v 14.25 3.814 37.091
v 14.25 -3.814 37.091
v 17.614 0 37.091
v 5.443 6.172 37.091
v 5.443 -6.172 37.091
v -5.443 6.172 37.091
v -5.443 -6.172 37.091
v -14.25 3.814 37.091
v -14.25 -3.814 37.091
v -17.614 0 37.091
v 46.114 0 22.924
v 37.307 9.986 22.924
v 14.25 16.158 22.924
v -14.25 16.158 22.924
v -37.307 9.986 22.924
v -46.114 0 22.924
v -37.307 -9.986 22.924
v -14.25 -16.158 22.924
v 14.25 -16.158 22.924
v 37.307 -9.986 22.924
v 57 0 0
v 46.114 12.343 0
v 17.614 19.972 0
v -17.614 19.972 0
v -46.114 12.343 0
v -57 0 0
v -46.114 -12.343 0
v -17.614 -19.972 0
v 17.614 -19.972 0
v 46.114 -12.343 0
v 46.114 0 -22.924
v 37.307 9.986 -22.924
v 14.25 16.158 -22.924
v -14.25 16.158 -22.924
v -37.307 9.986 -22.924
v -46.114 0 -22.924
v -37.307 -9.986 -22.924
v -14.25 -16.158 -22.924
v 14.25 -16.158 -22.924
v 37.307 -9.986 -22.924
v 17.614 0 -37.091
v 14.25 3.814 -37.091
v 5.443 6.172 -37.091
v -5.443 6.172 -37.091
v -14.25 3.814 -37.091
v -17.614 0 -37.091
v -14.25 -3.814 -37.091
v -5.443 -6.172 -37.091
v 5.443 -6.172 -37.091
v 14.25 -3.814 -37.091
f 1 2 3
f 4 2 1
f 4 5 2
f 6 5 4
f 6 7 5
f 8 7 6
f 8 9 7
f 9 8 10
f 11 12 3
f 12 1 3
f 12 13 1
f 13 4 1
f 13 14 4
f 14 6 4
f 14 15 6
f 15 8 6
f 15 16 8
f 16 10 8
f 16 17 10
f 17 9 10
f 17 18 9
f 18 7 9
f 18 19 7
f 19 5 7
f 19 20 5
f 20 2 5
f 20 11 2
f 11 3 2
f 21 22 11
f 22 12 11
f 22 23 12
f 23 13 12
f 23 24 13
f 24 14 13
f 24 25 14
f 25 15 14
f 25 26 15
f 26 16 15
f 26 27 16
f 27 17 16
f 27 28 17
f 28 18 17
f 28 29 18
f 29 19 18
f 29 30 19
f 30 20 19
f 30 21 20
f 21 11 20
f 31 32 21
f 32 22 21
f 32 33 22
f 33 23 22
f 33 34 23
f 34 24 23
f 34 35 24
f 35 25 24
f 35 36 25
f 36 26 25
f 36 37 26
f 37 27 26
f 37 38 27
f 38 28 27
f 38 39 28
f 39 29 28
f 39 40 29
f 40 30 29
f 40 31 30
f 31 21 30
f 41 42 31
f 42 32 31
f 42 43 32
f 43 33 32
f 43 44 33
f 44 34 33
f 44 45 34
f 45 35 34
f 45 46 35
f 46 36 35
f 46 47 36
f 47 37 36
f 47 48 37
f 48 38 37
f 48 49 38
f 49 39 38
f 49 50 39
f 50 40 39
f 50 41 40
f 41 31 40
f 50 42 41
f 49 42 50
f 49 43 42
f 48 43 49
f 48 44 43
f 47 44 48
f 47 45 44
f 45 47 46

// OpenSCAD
// Generated by SolidPython 1.0.1 on 2020-07-29 00:46:53


scale(v = [19, 7, 13]) {
	sphere(r = 3);
}
/***********************************************
*********      SolidPython code:      **********
************************************************
 
# import packages: SolidPython
from solid import *
from solid.utils import *
from itertools import chain, combinations, permutations


class Resize:

    def __init__(self, scad_file):
        self.scad_file = scad_file
        #self.scad_file = import_scad(scad_file)
        # cone/cylinder param:
        self.r1 = 0
        self.r2 = 0
        self.h = 0
        # rectangular prism param:
        self.w = 0
        self.l = 0
        # ellipse param:
        self.r = 0

    # import OpenScad code (file name corresponds to shape)


    # classify shape + parameters
    def assign(self, param1, param2, param3):
        if self.scad_file == 'cone.scad':
            self.r1 = param1
            self.r2 = param2
            self.h = param3
        elif self.scad_file == 'cylinder.scad':
            self.r1 = param1
            self.r2 = param2
            self.h = param3
        elif self.scad_file == 'rectangularPrism.scad':
            self.h = param1
            self.l = param2
            self.w = param3
        else:
            self.r = param1
            self.h = param2

    # resize parameters
    def iterate(self):
        x = range(3, 20, 2)
        i = 1
        if self.scad_file == 'cone.scad':
            tempList = list(permutations(x, 2))
            for temp in tempList:
                param1 = temp[0]
                param2 = temp[1]
                filepath = 'produced_scad_files/' + 'cone' + str(param1) + '_' + str(param2) + '_' + '.scad'
                scad_render_to_file(cylinder(h=param1, r1=param2, r2=0), filepath)

        elif self.scad_file == 'cylinder.scad':
            tempList = list(permutations(x, 3))
            for temp in tempList:
                param1 = temp[0]
                param2 = temp[1]
                filepath = 'produced_scad_files/' + 'cylinder' + str(param1) + '_' + str(param2) + '_' + '.scad'
                scad_render_to_file(cylinder(h=param1, r1=param2, r2=param2), filepath)

        elif self.scad_file == 'rectangularPrism.scad':
            tempList = list(permutations(x, 3))
            for temp in tempList:
                param1 = temp[0]
                param2 = temp[1]
                param3 = temp[2]
                filepath = 'produced_scad_files/' + 'rectangularPrism' + str(param1) + '_' + str(param2) + '_' + str(
                    param3) + '.scad'
                scad_render_to_file(cube(size=(param1, param2, param3)), filepath)

        elif self.scad_file == 'ellipse.scad':
            tempList = list(permutations(x, 4))
            for temp in tempList:
                param1 = temp[0]
                param2 = temp[1]
                param3 = temp[2]
                param4 = temp[3]
                filepath = 'produced_scad_files/' + 'ellipse' + str(param1) + '_' + str(param2) + '_' + str(param3) + '_' + str(param4) + '.scad'
                scad_render_to_file(scale([param1, param2, param3])(sphere(r=param4)), filepath)

    def render_to_scadfile(self):
        scad_render_to_file(scad, 'example.scad') 
 
************************************************/
